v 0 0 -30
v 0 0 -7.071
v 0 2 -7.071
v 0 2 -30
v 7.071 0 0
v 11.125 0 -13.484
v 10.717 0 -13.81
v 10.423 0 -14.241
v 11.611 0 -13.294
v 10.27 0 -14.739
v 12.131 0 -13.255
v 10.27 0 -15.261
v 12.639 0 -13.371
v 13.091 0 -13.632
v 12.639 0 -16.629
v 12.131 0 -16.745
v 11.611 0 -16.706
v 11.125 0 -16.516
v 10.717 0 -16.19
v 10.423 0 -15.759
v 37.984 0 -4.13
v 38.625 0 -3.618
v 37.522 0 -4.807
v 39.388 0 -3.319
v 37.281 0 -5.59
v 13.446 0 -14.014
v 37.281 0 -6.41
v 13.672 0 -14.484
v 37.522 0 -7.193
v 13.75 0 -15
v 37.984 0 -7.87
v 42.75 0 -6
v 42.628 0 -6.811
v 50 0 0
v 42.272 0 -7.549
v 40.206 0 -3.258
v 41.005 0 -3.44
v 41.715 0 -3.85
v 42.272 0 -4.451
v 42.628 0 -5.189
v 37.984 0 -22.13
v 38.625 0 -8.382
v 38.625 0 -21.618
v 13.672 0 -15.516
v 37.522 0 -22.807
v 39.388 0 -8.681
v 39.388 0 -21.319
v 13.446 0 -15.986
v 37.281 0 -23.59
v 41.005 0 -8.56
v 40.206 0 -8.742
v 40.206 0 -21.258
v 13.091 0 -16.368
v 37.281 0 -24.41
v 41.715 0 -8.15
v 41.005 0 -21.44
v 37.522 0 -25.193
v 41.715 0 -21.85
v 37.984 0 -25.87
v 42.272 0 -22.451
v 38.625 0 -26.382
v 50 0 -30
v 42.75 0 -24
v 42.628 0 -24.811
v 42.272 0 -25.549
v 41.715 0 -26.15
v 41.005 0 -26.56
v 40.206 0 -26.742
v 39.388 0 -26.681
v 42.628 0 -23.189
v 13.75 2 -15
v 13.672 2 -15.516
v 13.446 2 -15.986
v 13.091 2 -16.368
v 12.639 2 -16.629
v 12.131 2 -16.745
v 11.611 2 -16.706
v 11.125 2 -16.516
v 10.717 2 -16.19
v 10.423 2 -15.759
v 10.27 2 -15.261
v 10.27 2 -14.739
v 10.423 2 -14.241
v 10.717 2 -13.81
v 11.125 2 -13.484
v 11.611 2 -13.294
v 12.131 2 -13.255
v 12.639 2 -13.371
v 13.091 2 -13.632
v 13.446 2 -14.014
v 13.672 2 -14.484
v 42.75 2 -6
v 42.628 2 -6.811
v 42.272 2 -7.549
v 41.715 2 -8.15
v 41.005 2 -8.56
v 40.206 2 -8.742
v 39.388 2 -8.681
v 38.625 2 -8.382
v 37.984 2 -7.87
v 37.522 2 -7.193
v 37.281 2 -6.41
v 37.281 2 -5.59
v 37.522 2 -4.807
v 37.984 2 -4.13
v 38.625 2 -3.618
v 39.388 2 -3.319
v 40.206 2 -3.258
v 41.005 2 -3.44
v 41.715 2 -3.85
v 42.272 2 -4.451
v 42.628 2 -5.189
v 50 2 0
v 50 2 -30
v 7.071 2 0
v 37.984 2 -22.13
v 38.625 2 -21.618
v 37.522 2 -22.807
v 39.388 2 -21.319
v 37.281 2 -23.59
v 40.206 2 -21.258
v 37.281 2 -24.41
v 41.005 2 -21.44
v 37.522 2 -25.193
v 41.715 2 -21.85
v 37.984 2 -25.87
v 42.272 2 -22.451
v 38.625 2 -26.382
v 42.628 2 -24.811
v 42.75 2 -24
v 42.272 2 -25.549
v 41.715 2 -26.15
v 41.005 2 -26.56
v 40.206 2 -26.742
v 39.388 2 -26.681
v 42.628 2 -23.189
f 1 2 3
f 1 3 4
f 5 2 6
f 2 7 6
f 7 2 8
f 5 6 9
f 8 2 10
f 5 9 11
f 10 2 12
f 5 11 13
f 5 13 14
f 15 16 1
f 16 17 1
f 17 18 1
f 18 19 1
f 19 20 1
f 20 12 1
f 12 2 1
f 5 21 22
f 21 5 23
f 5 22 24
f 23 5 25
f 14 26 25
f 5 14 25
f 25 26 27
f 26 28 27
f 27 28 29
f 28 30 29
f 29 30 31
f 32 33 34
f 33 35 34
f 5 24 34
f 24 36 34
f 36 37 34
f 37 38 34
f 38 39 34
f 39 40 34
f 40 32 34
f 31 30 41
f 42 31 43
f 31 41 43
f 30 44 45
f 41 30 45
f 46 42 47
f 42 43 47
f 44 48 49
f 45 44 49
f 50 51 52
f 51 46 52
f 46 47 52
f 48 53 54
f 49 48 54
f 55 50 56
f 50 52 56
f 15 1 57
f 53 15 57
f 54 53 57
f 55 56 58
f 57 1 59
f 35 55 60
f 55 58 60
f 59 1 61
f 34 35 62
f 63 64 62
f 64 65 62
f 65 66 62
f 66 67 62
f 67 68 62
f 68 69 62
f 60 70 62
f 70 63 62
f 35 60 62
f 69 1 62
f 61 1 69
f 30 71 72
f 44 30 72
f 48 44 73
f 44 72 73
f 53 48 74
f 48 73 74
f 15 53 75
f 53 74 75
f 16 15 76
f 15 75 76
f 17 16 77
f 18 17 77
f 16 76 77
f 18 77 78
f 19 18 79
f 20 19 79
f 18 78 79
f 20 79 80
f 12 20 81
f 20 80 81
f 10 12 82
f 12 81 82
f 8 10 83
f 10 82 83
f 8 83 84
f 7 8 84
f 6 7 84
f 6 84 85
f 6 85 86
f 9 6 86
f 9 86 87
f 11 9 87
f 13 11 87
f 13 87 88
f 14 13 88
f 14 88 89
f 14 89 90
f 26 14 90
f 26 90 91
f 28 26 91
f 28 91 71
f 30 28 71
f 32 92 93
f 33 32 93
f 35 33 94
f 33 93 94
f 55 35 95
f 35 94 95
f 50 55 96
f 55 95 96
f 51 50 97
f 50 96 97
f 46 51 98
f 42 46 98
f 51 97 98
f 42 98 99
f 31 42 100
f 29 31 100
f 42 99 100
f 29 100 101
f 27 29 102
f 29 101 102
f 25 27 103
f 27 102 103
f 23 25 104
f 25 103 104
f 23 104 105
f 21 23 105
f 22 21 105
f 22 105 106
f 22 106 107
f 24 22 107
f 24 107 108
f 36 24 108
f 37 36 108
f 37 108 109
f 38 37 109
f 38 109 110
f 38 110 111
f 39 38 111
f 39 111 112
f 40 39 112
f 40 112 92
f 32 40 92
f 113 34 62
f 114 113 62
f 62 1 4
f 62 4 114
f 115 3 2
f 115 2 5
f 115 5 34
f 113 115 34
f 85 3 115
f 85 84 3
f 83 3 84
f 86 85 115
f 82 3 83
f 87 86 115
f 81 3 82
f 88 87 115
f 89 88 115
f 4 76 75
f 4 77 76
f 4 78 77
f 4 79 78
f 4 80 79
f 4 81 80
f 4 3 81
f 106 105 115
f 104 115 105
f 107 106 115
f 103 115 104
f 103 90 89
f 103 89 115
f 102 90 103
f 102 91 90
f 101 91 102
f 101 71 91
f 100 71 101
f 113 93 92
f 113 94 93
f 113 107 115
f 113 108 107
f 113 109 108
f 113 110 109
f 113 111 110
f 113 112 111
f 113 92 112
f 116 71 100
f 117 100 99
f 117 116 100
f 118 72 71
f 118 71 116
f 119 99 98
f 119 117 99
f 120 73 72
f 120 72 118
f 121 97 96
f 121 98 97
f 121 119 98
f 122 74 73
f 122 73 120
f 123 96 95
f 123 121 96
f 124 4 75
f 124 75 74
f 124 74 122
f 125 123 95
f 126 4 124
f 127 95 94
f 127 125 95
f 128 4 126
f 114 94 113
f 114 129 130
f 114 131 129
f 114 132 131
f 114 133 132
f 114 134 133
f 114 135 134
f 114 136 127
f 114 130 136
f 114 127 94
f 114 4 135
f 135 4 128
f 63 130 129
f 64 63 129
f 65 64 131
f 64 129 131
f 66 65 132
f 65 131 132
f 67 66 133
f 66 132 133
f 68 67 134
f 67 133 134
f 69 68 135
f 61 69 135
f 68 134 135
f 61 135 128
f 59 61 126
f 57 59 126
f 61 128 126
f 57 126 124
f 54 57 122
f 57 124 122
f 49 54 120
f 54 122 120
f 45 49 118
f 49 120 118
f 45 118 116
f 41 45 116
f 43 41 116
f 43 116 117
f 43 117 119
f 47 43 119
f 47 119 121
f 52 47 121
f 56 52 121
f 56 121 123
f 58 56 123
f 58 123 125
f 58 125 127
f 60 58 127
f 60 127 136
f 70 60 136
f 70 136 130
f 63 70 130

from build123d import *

# Parameters (mm, degrees)
SKETCH_1_W          = 50
SKETCH_1_H          = 30
EXTRUDE_1_DEPTH     = 2
SKETCH_2_R          = 2.75
SKETCH_2_R_2        = 1.75
CUT_EXTRUDE_1_DEPTH = 3


with BuildPart() as part:
    # 草图1 → 凸台-拉伸1 (new body)
    with BuildSketch(Plane(origin=(0, 0, 0), x_dir=(1, 0, 0), z_dir=(0, 1, 0))):
        with Locations((25, 15)):
            Rectangle(SKETCH_1_W, SKETCH_1_H)
    extrude(amount=EXTRUDE_1_DEPTH)

    # 草图2 → 切除-拉伸1 (cut, through all)
    with BuildSketch(Plane(origin=(0, 2, 0), x_dir=(1, 0, 0), z_dir=(0, 1, 0))):
        with Locations((40, 6)):
            Circle(SKETCH_2_R)
        with Locations((12, 15)):
            Circle(SKETCH_2_R_2)
        with Locations((40, 24)):
            Circle(SKETCH_2_R)
        Polygon((0, 7.071067812), (7.071067812, 0), (0, 0), align=None)
    extrude(amount=-CUT_EXTRUDE_1_DEPTH, mode=Mode.SUBTRACT)


solid = part.part
